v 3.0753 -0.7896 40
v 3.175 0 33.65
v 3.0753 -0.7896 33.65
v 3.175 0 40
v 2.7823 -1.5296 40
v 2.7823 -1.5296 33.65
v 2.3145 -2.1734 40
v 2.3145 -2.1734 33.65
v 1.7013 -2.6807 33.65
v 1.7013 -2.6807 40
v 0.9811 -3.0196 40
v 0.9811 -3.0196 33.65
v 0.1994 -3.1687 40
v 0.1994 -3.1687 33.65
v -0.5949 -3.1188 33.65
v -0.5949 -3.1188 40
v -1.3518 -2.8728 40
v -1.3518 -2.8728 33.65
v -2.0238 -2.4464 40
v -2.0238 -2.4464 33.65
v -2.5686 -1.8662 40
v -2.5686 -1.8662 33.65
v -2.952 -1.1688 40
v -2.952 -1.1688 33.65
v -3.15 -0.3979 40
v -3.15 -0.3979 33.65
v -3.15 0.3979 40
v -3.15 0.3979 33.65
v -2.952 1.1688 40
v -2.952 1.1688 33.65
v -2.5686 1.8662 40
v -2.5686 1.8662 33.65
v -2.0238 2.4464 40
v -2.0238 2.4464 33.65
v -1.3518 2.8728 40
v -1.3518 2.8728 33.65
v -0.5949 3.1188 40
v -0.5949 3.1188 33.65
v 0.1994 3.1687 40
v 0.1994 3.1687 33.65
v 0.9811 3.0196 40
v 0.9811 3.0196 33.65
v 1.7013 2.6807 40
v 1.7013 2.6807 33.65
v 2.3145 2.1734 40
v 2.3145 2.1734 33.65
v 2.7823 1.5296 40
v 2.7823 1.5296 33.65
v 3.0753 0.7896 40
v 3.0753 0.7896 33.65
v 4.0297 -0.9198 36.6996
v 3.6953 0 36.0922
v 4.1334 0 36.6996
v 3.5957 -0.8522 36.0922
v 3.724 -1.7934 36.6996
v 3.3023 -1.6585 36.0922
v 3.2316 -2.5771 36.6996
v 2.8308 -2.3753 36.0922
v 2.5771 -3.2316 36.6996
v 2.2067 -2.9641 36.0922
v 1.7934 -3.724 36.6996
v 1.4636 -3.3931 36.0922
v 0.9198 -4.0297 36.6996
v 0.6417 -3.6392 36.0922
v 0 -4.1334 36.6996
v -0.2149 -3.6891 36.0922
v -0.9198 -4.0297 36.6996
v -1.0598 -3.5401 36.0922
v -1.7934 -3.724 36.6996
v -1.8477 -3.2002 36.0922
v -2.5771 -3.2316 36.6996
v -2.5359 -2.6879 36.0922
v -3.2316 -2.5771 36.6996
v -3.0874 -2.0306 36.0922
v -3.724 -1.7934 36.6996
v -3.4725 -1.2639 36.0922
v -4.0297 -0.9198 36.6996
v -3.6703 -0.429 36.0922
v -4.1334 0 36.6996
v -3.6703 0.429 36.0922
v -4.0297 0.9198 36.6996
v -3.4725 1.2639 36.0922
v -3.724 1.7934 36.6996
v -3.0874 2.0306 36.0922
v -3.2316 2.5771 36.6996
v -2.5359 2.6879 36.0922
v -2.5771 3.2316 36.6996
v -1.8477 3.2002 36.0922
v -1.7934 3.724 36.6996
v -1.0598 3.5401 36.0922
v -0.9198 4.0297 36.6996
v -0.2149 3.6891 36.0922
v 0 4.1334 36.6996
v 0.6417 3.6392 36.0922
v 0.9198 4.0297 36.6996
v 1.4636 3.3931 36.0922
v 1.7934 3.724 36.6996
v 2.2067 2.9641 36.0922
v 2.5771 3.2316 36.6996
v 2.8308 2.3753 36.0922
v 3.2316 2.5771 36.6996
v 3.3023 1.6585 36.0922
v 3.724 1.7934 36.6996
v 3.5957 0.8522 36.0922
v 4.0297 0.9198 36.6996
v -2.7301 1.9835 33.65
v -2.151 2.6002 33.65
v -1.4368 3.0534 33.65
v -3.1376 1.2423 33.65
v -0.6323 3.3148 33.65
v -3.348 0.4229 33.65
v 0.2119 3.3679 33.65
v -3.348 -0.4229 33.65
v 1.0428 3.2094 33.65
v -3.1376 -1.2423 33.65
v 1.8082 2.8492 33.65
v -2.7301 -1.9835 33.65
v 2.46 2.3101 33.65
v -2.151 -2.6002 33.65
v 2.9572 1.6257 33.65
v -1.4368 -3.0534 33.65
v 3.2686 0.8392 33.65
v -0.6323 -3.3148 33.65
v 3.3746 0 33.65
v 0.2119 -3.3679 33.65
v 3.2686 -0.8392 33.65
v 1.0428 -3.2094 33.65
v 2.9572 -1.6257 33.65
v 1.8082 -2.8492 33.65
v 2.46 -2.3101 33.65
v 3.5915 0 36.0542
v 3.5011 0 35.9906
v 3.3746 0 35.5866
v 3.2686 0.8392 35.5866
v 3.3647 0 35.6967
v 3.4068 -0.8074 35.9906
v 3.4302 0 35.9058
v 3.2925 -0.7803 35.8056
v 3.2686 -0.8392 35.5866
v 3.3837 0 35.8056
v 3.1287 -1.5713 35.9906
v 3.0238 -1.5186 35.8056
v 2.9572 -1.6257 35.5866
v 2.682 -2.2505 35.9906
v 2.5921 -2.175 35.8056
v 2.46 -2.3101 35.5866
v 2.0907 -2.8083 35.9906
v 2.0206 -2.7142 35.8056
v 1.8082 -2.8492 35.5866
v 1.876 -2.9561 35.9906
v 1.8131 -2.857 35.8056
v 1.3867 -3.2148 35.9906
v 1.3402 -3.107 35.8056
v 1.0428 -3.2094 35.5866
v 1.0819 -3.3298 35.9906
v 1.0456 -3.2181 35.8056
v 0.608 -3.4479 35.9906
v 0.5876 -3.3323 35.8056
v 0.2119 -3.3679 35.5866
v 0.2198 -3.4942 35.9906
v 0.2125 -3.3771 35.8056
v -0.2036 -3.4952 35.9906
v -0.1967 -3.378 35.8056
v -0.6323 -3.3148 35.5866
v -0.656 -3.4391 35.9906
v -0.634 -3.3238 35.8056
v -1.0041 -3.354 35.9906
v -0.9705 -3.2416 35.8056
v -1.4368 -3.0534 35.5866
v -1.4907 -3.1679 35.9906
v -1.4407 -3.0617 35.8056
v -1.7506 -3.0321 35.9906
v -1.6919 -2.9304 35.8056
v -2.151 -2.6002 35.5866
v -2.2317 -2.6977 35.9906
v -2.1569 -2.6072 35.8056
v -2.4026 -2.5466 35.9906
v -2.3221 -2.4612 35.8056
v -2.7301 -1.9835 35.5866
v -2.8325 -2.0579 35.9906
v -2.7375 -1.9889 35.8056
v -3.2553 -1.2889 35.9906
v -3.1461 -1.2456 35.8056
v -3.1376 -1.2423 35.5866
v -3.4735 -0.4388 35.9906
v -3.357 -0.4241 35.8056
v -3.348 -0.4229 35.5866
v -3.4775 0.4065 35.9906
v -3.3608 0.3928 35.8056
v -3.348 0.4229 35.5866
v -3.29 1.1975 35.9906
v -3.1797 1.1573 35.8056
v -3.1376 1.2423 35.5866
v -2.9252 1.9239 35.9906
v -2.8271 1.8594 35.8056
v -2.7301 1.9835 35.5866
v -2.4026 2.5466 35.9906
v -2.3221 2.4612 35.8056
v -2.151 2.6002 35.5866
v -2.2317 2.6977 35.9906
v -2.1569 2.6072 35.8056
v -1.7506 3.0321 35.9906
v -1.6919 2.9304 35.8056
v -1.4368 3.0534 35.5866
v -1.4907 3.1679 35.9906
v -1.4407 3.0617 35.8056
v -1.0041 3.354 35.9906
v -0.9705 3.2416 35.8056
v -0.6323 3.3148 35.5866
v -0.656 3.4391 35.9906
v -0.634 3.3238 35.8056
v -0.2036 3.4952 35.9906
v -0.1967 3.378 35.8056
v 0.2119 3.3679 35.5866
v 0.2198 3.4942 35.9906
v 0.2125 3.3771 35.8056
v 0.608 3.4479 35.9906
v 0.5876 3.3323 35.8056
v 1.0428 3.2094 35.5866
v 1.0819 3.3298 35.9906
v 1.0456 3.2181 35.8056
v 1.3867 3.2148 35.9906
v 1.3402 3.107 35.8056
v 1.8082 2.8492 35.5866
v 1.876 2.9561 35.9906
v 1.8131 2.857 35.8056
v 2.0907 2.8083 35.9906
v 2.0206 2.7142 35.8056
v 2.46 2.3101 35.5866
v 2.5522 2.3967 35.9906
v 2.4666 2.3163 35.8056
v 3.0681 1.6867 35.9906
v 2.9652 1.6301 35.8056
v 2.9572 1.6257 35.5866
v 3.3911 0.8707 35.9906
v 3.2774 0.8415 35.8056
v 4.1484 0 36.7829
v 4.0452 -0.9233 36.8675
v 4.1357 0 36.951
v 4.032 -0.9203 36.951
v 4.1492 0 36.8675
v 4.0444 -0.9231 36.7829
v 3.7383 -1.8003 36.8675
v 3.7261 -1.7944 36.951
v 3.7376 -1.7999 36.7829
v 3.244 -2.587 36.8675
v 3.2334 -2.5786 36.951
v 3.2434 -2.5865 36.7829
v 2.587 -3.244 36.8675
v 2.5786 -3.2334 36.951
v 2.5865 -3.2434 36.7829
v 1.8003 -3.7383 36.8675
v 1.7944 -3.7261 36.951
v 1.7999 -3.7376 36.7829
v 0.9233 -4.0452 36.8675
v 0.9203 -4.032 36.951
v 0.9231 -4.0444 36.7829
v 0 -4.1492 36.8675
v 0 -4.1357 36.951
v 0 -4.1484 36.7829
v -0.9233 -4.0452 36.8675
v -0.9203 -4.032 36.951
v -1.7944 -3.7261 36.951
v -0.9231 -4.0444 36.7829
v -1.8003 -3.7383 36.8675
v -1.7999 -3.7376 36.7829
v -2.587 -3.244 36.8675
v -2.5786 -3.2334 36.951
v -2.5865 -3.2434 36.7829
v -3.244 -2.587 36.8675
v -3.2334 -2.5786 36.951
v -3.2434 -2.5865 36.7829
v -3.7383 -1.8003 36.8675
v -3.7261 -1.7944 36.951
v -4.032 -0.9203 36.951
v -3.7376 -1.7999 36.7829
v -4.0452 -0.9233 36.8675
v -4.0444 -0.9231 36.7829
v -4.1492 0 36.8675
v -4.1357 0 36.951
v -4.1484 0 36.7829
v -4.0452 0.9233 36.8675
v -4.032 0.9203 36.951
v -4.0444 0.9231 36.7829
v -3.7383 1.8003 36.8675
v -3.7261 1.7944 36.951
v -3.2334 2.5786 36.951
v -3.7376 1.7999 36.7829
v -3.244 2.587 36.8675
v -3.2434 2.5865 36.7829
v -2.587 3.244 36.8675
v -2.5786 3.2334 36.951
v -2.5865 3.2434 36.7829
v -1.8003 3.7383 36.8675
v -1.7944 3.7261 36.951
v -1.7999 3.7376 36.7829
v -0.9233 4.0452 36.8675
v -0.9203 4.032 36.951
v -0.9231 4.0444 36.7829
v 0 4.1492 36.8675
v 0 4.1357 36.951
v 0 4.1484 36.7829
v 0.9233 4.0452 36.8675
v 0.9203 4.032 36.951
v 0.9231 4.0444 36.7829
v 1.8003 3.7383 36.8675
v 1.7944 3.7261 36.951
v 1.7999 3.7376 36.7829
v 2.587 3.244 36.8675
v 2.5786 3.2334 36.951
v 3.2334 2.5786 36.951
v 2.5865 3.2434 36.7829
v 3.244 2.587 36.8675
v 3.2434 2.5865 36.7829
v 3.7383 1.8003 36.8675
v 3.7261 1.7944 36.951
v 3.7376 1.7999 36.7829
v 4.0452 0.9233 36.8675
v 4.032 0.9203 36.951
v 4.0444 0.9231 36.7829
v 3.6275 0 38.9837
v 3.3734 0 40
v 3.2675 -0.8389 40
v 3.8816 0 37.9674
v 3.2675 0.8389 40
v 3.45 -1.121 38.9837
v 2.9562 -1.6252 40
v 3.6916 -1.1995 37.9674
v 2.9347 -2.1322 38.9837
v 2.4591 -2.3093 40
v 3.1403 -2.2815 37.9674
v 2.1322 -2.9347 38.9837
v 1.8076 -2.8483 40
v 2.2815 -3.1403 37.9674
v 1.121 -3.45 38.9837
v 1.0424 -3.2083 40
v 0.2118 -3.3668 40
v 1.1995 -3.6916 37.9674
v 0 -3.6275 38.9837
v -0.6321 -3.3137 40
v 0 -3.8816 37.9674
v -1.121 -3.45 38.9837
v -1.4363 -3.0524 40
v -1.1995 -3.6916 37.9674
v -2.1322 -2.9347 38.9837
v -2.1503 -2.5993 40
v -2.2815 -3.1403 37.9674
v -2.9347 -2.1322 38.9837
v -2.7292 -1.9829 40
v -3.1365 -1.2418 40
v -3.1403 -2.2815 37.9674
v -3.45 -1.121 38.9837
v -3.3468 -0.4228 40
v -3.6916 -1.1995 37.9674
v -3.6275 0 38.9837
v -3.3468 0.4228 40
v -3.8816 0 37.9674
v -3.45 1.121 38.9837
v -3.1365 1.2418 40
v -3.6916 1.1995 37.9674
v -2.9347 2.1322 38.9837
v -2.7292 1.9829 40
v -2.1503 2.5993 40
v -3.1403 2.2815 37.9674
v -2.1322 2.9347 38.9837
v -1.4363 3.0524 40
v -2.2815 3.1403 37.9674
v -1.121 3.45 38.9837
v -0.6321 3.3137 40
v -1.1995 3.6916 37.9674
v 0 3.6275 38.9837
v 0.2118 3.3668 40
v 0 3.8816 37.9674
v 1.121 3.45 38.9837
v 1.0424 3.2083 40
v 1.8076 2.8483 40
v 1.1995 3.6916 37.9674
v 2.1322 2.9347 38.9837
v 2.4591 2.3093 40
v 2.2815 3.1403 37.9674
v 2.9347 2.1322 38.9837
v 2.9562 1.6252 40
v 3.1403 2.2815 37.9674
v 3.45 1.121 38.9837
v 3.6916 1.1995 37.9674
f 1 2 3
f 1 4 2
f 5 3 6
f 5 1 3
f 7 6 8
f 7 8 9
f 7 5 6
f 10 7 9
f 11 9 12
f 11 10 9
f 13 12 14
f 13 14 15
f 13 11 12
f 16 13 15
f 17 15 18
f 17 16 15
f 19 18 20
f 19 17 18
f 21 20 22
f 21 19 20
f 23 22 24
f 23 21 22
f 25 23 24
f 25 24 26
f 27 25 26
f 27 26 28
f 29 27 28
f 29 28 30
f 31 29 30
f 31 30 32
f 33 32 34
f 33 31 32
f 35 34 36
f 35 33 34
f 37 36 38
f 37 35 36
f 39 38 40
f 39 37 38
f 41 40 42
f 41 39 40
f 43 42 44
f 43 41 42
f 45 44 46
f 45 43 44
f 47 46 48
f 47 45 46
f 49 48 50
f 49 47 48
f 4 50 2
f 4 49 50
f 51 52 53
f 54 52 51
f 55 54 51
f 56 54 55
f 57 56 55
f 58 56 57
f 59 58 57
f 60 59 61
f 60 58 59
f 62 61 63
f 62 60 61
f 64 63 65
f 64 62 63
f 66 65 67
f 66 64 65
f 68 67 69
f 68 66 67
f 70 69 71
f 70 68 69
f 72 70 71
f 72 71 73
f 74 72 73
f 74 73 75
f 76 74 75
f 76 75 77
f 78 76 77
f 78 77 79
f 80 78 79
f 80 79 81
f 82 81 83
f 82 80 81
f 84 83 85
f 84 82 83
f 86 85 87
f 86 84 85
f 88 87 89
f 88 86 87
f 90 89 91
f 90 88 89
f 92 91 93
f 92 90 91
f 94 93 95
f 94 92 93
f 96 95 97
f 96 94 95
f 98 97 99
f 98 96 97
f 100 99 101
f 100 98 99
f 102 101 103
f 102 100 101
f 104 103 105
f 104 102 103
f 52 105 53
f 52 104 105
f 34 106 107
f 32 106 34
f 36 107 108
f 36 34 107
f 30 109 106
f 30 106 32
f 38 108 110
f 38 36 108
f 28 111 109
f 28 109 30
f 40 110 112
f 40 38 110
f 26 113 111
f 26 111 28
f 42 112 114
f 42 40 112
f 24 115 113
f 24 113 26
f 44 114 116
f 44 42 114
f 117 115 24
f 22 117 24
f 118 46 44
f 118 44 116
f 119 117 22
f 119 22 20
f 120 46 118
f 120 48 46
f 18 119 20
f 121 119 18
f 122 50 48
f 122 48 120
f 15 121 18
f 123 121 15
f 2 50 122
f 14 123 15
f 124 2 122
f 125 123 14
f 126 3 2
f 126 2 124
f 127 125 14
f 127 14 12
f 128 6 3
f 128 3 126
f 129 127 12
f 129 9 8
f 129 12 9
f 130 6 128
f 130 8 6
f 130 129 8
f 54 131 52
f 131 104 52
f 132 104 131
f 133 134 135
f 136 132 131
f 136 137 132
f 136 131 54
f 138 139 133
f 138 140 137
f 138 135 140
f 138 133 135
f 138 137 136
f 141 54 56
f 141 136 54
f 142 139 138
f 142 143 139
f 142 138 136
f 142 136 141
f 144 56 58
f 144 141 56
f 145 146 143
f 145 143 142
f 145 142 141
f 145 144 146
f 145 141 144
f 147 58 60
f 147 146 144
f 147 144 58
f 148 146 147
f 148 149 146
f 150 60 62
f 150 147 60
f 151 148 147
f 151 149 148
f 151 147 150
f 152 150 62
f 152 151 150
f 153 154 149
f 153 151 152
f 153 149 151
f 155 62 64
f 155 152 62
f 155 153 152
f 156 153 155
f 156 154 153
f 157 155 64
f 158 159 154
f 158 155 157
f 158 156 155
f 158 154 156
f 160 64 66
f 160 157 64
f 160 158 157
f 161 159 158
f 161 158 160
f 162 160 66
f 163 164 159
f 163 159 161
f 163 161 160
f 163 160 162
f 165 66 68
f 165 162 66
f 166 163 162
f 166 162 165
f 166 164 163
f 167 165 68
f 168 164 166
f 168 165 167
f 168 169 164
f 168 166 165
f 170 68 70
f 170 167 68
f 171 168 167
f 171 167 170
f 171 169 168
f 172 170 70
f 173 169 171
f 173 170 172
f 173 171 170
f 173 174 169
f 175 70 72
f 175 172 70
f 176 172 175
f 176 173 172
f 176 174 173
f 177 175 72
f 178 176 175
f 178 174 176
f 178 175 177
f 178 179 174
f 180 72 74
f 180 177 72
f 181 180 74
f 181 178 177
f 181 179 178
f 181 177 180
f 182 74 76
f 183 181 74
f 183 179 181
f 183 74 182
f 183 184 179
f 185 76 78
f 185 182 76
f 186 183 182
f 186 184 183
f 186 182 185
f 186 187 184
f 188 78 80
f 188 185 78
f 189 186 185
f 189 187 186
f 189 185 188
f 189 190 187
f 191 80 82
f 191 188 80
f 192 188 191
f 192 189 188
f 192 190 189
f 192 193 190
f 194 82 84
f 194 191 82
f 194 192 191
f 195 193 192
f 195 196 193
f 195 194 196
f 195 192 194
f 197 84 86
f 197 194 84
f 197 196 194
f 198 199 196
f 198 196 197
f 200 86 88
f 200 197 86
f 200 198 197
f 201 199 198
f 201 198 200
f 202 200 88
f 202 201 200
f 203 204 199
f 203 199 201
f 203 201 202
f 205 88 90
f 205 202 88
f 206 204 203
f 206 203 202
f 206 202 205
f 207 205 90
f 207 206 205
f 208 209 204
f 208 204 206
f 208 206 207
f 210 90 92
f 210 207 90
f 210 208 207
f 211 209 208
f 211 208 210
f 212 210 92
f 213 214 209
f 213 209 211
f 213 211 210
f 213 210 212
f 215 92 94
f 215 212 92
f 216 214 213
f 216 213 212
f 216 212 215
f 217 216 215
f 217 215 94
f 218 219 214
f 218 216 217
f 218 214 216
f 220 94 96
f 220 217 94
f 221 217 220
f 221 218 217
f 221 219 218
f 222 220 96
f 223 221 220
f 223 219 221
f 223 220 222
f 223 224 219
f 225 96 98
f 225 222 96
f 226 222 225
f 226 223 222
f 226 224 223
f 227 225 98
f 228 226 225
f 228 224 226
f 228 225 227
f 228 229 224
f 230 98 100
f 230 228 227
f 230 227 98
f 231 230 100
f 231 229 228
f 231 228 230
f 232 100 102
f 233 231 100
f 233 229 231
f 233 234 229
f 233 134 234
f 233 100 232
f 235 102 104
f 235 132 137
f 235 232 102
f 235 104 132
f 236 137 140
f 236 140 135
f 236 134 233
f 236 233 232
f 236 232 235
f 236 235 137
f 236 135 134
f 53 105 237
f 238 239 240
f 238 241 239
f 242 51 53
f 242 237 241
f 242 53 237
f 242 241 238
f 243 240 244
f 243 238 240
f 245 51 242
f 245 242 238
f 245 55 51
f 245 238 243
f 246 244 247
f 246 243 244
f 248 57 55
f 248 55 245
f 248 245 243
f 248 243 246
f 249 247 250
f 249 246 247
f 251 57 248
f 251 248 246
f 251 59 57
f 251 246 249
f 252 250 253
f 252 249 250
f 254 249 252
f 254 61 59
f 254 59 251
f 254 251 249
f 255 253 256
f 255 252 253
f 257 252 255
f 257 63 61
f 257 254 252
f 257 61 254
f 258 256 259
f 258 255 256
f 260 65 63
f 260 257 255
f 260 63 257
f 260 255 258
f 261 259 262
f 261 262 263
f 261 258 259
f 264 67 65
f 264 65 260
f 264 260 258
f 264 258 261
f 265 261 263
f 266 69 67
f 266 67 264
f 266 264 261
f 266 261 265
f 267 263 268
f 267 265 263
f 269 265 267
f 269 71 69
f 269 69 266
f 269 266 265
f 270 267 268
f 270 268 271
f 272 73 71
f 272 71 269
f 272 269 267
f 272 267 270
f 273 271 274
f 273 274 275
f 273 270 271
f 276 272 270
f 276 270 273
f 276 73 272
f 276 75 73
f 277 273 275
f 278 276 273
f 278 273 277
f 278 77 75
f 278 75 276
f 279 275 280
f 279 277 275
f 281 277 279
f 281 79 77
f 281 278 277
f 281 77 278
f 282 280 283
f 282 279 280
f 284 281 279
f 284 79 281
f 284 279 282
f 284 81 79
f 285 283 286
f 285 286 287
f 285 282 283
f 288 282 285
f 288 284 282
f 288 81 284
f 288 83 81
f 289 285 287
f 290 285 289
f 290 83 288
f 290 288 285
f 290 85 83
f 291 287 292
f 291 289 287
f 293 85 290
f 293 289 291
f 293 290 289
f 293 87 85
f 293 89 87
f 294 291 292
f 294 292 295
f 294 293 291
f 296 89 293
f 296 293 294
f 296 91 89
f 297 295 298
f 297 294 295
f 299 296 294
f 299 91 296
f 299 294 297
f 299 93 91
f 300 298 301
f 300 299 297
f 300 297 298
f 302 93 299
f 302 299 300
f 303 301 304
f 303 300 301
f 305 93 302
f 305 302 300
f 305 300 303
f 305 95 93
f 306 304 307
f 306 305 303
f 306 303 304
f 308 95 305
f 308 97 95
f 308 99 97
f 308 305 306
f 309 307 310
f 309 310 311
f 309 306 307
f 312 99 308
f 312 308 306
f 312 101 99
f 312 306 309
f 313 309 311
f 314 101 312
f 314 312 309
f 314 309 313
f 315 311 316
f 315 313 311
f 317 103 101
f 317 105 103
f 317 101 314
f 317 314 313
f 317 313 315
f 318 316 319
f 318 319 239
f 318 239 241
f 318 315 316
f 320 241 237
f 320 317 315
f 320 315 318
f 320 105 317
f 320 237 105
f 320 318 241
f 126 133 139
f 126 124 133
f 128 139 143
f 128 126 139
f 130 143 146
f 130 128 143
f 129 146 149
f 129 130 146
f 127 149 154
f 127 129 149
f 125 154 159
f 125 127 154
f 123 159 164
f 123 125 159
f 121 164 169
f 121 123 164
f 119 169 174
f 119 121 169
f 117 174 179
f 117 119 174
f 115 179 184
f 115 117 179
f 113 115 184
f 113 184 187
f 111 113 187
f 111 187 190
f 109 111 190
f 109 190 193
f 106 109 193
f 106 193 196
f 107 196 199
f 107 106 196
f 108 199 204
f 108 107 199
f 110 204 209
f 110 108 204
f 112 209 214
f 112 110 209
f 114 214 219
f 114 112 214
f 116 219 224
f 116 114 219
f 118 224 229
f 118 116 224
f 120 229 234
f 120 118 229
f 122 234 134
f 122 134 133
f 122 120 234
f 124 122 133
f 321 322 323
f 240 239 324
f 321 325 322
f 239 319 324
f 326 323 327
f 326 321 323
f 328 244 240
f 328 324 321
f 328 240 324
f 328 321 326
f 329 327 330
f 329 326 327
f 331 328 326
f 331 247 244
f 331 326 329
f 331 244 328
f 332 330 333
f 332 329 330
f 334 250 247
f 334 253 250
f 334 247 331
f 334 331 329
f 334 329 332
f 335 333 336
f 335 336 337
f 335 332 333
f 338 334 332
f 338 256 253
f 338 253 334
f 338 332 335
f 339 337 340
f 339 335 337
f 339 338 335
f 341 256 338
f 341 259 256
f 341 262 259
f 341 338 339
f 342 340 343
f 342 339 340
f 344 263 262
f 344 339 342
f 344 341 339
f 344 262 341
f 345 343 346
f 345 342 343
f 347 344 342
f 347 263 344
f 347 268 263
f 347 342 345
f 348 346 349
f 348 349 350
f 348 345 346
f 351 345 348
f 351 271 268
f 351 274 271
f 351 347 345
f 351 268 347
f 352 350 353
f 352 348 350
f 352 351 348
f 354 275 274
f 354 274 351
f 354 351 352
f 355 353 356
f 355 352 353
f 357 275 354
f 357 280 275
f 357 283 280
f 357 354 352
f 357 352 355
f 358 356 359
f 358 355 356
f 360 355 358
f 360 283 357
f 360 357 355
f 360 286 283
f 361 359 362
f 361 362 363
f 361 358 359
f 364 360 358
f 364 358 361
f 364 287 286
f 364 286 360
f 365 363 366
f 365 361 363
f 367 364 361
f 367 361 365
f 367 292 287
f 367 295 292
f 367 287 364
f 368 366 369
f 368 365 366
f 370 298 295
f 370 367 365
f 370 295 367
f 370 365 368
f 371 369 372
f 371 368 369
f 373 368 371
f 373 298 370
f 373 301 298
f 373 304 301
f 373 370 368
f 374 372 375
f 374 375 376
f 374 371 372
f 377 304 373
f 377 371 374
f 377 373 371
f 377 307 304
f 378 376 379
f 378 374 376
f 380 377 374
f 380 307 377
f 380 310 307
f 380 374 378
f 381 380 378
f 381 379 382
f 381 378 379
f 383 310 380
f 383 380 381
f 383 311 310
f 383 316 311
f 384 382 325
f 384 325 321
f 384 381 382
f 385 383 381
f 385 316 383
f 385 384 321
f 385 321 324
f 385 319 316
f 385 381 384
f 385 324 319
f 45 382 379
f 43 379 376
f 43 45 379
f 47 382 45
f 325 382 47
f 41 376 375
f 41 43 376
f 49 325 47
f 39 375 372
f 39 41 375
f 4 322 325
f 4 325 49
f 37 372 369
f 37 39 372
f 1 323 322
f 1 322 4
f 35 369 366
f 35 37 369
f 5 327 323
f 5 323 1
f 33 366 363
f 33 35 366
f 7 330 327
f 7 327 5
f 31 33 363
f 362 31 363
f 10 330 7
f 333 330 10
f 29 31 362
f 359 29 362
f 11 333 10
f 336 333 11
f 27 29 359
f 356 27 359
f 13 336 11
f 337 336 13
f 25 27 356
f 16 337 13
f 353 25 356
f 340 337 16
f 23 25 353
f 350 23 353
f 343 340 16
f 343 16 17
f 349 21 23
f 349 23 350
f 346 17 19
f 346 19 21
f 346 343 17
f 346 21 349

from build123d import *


with BuildPart() as part:
    # Esboço1 → Revolução4 (revolve)
    with BuildSketch(Plane(origin=(0, 0, 0), x_dir=(0, 0, -1), z_dir=(1, 0, 0)), mode=Mode.PRIVATE) as revolu_o4_sk:
        with BuildLine():
            Line((-36.699570276, 4.133360134), (-36.092161543, 3.695324027))
            ThreePointArc((-36.092161543, 3.695324027), (-35.905826449, 3.430249421), (-35.58663159, 3.374572178))
            Line((-35.58663159, 3.374572178), (-33.65, 3.374572178))
            Line((-33.65, 3.374572178), (-33.65, 3.175))
            Line((-33.65, 3.175), (-40, 3.175))
            Line((-40, 3.175), (-40, 3.3734375))
            Line((-40, 3.3734375), (-36.951032326, 4.135679419))
            ThreePointArc((-36.951032326, 4.135679419), (-36.825153111, 4.150586903), (-36.699570276, 4.133360134))
        make_face()
    revolve(revolu_o4_sk.sketch.rotate(Axis((0, 0, 40), (0, 0, -1)), 90), axis=Axis((0, 0, 40), (0, 0, -1)))


solid = part.part
